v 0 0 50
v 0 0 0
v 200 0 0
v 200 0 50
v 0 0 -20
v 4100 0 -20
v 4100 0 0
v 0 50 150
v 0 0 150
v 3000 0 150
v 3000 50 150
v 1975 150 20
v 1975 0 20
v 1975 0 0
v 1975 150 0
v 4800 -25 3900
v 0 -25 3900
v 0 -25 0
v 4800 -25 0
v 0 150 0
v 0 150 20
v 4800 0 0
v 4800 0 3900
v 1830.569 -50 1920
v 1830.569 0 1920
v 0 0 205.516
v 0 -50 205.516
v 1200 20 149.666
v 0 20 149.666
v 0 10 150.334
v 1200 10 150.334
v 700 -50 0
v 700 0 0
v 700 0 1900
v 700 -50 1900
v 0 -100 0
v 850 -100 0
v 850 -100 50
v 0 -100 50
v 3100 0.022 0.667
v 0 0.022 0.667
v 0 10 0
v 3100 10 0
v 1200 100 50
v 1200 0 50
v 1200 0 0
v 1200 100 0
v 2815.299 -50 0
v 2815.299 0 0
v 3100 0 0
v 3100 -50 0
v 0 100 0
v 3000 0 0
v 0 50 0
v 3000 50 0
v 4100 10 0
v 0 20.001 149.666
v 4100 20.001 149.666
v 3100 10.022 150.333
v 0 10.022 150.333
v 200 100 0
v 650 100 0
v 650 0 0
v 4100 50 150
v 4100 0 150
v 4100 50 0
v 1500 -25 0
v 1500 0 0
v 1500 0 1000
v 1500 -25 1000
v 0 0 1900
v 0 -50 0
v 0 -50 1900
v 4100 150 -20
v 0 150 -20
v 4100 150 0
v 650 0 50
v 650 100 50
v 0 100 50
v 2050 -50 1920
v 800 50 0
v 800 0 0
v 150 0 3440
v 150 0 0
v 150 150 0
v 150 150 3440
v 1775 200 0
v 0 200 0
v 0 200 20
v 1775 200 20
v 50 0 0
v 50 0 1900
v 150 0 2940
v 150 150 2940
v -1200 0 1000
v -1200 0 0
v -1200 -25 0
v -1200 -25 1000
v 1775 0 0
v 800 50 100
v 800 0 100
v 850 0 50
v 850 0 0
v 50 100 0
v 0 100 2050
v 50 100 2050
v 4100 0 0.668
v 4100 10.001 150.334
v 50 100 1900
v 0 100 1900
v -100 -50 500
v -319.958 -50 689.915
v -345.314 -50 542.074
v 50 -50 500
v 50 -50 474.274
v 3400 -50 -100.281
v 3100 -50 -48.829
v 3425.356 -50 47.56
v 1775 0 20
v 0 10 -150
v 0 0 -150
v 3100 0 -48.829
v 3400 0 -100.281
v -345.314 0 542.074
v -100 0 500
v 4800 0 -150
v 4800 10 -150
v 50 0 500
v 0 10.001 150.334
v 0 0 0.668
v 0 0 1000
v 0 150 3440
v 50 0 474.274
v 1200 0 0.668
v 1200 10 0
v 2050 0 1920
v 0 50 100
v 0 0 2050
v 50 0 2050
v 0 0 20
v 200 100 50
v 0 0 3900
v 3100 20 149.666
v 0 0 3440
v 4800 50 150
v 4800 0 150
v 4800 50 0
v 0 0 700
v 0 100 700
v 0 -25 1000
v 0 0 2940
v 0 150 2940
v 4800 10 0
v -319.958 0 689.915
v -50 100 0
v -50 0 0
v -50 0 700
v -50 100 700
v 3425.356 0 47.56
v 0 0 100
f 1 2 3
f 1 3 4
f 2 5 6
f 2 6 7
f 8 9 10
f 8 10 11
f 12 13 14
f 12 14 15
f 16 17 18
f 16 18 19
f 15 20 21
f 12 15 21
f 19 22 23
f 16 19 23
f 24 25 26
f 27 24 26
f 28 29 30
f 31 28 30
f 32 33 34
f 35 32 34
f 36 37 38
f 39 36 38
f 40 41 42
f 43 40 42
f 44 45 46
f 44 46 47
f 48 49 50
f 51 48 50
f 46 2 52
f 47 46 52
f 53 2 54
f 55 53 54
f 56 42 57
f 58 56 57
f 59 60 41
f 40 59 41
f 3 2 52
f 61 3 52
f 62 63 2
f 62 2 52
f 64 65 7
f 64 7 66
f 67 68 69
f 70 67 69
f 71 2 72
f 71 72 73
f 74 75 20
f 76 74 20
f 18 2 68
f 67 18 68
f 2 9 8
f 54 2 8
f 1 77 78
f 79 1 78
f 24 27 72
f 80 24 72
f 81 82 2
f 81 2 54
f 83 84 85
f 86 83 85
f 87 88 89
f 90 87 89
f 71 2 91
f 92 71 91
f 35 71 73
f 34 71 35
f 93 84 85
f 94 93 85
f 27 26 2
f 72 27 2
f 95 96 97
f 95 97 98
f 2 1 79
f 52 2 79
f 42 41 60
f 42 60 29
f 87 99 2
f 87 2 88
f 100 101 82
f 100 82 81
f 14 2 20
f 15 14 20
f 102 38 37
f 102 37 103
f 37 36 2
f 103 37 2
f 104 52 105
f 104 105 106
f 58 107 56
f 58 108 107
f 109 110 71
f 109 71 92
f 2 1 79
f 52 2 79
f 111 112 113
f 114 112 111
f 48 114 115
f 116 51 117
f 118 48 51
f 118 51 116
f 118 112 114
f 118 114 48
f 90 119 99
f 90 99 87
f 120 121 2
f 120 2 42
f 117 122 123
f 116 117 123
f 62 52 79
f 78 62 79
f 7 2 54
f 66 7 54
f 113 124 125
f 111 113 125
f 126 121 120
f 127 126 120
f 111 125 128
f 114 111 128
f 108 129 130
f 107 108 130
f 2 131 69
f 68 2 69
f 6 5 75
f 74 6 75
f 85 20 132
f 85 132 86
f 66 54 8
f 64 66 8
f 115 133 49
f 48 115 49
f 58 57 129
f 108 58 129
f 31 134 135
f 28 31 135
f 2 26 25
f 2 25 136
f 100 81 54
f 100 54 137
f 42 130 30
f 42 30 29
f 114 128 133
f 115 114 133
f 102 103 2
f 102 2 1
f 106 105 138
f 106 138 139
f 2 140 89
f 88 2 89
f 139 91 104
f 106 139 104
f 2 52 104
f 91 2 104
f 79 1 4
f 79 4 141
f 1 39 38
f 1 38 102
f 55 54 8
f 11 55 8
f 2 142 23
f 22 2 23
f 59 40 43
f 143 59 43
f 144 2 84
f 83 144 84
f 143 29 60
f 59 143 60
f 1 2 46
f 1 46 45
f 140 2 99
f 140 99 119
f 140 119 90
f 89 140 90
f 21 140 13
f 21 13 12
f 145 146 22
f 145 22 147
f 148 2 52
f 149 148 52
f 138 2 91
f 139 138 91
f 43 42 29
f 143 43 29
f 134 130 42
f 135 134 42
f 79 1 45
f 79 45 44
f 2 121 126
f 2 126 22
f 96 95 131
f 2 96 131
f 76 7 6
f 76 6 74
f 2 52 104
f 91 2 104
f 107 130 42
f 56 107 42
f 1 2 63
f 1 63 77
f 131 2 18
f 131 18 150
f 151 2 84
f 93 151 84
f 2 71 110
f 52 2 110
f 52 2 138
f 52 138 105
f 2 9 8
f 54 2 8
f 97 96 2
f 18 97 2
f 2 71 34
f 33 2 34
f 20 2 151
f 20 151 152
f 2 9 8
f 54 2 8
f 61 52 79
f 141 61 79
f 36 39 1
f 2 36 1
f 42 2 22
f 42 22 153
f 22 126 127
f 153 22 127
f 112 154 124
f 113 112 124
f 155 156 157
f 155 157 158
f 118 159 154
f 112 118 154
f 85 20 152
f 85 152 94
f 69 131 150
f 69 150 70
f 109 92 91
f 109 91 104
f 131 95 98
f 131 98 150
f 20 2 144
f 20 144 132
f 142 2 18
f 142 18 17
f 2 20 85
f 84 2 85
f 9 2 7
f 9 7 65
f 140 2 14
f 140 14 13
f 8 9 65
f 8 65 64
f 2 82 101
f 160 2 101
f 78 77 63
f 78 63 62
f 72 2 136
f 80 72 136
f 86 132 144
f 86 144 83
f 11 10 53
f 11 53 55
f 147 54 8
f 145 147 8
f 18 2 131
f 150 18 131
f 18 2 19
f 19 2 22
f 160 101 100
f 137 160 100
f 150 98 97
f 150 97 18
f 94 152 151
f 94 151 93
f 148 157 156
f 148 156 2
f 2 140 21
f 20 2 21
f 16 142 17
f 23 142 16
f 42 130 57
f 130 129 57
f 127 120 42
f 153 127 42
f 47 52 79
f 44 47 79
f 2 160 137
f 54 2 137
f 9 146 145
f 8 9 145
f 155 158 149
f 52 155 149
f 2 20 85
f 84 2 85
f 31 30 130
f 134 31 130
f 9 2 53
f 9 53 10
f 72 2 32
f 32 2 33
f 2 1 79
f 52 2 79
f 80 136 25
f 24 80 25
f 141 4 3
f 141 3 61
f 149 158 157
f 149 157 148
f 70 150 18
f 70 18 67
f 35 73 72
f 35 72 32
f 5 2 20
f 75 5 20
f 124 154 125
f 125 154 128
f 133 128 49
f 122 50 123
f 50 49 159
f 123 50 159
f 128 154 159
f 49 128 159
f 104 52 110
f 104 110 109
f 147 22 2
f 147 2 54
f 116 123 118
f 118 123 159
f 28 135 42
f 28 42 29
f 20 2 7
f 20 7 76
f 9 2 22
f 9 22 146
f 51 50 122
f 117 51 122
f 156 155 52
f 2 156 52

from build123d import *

# Parameters (mm, degrees)
F0_W      = 150
F0_H      = 150
F1_DEPTH  = 3440
F2_W      = 150
F2_H      = 150
F3_DEPTH  = 2940
F4_W      = 50
F4_H      = 150
F5_DEPTH  = 4100
F6_W      = 50
F6_H      = 150
F7_DEPTH  = 3000
F8_W      = 50
F8_H      = 150
F9_DEPTH  = 4800
F10_W     = 150
F10_H     = 20
F11_DEPTH = 4100
F12_W     = 200
F12_H     = 20
F13_DEPTH = 1775
F16_W     = 150
F16_H     = 20
F17_DEPTH = 1975
F19_DEPTH = 50
F21_DEPTH = 4100
F23_DEPTH = 3100
F24_W     = 4800
F24_H     = 3900
F25_DEPTH = 25
F26_W     = 700
F26_H     = 1900
F27_DEPTH = 50
F28_W     = 1500
F28_H     = 1000
F29_DEPTH = 25
F30_W     = 50
F30_H     = 100
F31_DEPTH = 2050
F32_W     = 50
F32_H     = 100
F33_DEPTH = 1900
F34_W     = 50
F34_H     = 100
F35_DEPTH = 800
F36_W     = 50
F36_H     = 100
F37_DEPTH = 700
F38_W     = 100
F38_H     = 50
F39_DEPTH = 1200
F40_W     = 100
F40_H     = 50
F41_DEPTH = 200
F43_DEPTH = 50
F44_W     = 100
F44_H     = 50
F45_DEPTH = 850
F46_W     = 100
F46_H     = 50
F47_DEPTH = 650
F49_DEPTH = 1200
F50_W     = 10
F50_H     = 150
F51_DEPTH = 4800
F52_W     = 1200
F52_H     = 1000
F53_DEPTH = 25


# Not quite as in the source:
# - a feature names something its author has since deleted; it is built from what else it names


with BuildPart() as f1:
    # F0 (on Top) → F1 (new body)
    with BuildSketch(Plane.XY):
        with Locations((75, 75)):
            Rectangle(F0_W, F0_H)
    extrude(amount=F1_DEPTH)


with BuildPart() as f3:
    # F2 (on Top) → F3 (new body)
    with BuildSketch(Plane.XY):
        with Locations((75, 75)):
            Rectangle(F2_W, F2_H)
    extrude(amount=F3_DEPTH)


with BuildPart() as f5:
    # F4 (on Right) → F5 (new body)
    with BuildSketch(Plane.YZ):
        with Locations((25, 75)):
            Rectangle(F4_W, F4_H)
    extrude(amount=F5_DEPTH)


with BuildPart() as f7:
    # F6 (on Right) → F7 (new body)
    with BuildSketch(Plane.YZ):
        with Locations((25, 75)):
            Rectangle(F6_W, F6_H)
    extrude(amount=F7_DEPTH)


with BuildPart() as f9:
    # F8 (on Right) → F9 (new body)
    with BuildSketch(Plane.YZ):
        with Locations((25, 75)):
            Rectangle(F8_W, F8_H)
    extrude(amount=F9_DEPTH)


with BuildPart() as f11:
    # F10 (on Right) → F11 (new body)
    with BuildSketch(Plane.YZ):
        with Locations((75, -10)):
            Rectangle(F10_W, F10_H)
    extrude(amount=F11_DEPTH)


with BuildPart() as f13:
    # F12 (on Right) → F13 (new body)
    with BuildSketch(Plane.YZ):
        with Locations((100, 10)):
            Rectangle(F12_W, F12_H)
    extrude(amount=F13_DEPTH)


with BuildPart() as f14_1:
    # F14: copy of F13
    add(f13.part)


with BuildPart() as f17:
    # F16 (on Right) → F17 (new body)
    with BuildSketch(Plane.YZ):
        with Locations((75, 10)):
            Rectangle(F16_W, F16_H)
    extrude(amount=F17_DEPTH)


with BuildPart() as f19:
    # F18 (on Front) → F19 (new body)
    with BuildSketch(Plane.XZ):
        Polygon((2815.2993068946, 0), (2899.6957839059, 0), (3050, 0), (3100, 0), (3100, -48.8287244524), (3400, -100.2814173698), (3425.3561200039, 47.5599407758), (3396.9886494943, 52.4252166057), (-319.9582863525, 689.9149808739), (-345.3144063564, 542.0736227282), (-100, 500), (0, 500), (50, 500), (50, 474.2736535413), align=None)
    extrude(amount=F19_DEPTH)


with BuildPart() as f21:
    # F20 (on Right) → F21 (new body)
    with BuildSketch(Plane.YZ):
        Polygon((0, 0.6682313415), (10, 0), (20.0011657345, 149.6662175775), (10.0011657345, 150.334448919), align=None)
    extrude(amount=F21_DEPTH)


with BuildPart() as f23:
    # F22 (on Right) → F23 (new body)
    with BuildSketch(Plane.YZ):
        Polygon((0.0222469686, 0.6666666667), (10, 0), (20, 149.666295471), (10.0222469686, 150.3329621376), align=None)
    extrude(amount=F23_DEPTH)


with BuildPart() as f25:
    # F24 (on Front) → F25 (new body)
    with BuildSketch(Plane.XZ):
        with Locations((2400, 1950)):
            Rectangle(F24_W, F24_H)
    extrude(amount=F25_DEPTH)


with BuildPart() as f27:
    # F26 (on Front) → F27 (new body)
    with BuildSketch(Plane.XZ):
        with Locations((350, 950)):
            Rectangle(F26_W, F26_H)
    extrude(amount=F27_DEPTH)


with BuildPart() as f29:
    # F28 (on Front) → F29 (new body)
    with BuildSketch(Plane.XZ):
        with Locations((750, 500)):
            Rectangle(F28_W, F28_H)
    extrude(amount=F29_DEPTH)


with BuildPart() as f31:
    # F30 (on Top) → F31 (new body)
    with BuildSketch(Plane.XY):
        with Locations((25, 50)):
            Rectangle(F30_W, F30_H)
    extrude(amount=F31_DEPTH)


with BuildPart() as f33:
    # F32 (on Top) → F33 (new body)
    with BuildSketch(Plane.XY):
        with Locations((25, 50)):
            Rectangle(F32_W, F32_H)
    extrude(amount=F33_DEPTH)


with BuildPart() as f35:
    # F34 (on Right) → F35 (new body)
    with BuildSketch(Plane.YZ):
        with Locations((25, 50)):
            Rectangle(F34_W, F34_H)
    extrude(amount=F35_DEPTH)


with BuildPart() as f37:
    # F36 (on Top) → F37 (new body)
    with BuildSketch(Plane.XY):
        with Locations((-25, 50)):
            Rectangle(F36_W, F36_H)
    extrude(amount=F37_DEPTH)


with BuildPart() as f39:
    # F38 (on Right) → F39 (new body)
    with BuildSketch(Plane.YZ):
        with Locations((50, 25)):
            Rectangle(F38_W, F38_H)
    extrude(amount=F39_DEPTH)


with BuildPart() as f41:
    # F40 (on Right) → F41 (new body)
    with BuildSketch(Plane.YZ):
        with Locations((50, 25)):
            Rectangle(F40_W, F40_H)
    extrude(amount=F41_DEPTH)


with BuildPart() as f43:
    # F42 (on Front) → F43 (new body)
    with BuildSketch(Plane.XZ):
        Polygon((2050, 1920), (1830.5688617947, 1920), (0, 205.5159928557), (0, 0), align=None)
    extrude(amount=F43_DEPTH)


with BuildPart() as f45:
    # F44 (on Right) → F45 (new body)
    with BuildSketch(Plane.YZ):
        with Locations((-50, 25)):
            Rectangle(F44_W, F44_H)
    extrude(amount=F45_DEPTH)


with BuildPart() as f47:
    # F46 (on Right) → F47 (new body)
    with BuildSketch(Plane.YZ):
        with Locations((50, 25)):
            Rectangle(F46_W, F46_H)
    extrude(amount=F47_DEPTH)


with BuildPart() as f49:
    # F48 (on Right) → F49 (new body)
    with BuildSketch(Plane.YZ):
        Polygon((0, 0.6681531048), (10, 0), (20, 149.666295471), (10, 150.3344485757), align=None)
    extrude(amount=F49_DEPTH)


with BuildPart() as f51:
    # F50 (on Right) → F51 (new body)
    with BuildSketch(Plane.YZ):
        with Locations((5, -75)):
            Rectangle(F50_W, F50_H)
    extrude(amount=F51_DEPTH)


with BuildPart() as f53:
    # F52 (on Front) → F53 (new body)
    with BuildSketch(Plane.XZ):
        with Locations((-600, 500)):
            Rectangle(F52_W, F52_H)
    extrude(amount=F53_DEPTH)


solid = Compound([f1.part, f3.part, f5.part, f7.part, f9.part, f11.part, f13.part, f17.part, f19.part, f21.part, f23.part, f25.part, f27.part, f29.part, f31.part, f33.part, f35.part, f37.part, f39.part, f41.part, f43.part, f45.part, f47.part, f49.part, f51.part, f53.part])
